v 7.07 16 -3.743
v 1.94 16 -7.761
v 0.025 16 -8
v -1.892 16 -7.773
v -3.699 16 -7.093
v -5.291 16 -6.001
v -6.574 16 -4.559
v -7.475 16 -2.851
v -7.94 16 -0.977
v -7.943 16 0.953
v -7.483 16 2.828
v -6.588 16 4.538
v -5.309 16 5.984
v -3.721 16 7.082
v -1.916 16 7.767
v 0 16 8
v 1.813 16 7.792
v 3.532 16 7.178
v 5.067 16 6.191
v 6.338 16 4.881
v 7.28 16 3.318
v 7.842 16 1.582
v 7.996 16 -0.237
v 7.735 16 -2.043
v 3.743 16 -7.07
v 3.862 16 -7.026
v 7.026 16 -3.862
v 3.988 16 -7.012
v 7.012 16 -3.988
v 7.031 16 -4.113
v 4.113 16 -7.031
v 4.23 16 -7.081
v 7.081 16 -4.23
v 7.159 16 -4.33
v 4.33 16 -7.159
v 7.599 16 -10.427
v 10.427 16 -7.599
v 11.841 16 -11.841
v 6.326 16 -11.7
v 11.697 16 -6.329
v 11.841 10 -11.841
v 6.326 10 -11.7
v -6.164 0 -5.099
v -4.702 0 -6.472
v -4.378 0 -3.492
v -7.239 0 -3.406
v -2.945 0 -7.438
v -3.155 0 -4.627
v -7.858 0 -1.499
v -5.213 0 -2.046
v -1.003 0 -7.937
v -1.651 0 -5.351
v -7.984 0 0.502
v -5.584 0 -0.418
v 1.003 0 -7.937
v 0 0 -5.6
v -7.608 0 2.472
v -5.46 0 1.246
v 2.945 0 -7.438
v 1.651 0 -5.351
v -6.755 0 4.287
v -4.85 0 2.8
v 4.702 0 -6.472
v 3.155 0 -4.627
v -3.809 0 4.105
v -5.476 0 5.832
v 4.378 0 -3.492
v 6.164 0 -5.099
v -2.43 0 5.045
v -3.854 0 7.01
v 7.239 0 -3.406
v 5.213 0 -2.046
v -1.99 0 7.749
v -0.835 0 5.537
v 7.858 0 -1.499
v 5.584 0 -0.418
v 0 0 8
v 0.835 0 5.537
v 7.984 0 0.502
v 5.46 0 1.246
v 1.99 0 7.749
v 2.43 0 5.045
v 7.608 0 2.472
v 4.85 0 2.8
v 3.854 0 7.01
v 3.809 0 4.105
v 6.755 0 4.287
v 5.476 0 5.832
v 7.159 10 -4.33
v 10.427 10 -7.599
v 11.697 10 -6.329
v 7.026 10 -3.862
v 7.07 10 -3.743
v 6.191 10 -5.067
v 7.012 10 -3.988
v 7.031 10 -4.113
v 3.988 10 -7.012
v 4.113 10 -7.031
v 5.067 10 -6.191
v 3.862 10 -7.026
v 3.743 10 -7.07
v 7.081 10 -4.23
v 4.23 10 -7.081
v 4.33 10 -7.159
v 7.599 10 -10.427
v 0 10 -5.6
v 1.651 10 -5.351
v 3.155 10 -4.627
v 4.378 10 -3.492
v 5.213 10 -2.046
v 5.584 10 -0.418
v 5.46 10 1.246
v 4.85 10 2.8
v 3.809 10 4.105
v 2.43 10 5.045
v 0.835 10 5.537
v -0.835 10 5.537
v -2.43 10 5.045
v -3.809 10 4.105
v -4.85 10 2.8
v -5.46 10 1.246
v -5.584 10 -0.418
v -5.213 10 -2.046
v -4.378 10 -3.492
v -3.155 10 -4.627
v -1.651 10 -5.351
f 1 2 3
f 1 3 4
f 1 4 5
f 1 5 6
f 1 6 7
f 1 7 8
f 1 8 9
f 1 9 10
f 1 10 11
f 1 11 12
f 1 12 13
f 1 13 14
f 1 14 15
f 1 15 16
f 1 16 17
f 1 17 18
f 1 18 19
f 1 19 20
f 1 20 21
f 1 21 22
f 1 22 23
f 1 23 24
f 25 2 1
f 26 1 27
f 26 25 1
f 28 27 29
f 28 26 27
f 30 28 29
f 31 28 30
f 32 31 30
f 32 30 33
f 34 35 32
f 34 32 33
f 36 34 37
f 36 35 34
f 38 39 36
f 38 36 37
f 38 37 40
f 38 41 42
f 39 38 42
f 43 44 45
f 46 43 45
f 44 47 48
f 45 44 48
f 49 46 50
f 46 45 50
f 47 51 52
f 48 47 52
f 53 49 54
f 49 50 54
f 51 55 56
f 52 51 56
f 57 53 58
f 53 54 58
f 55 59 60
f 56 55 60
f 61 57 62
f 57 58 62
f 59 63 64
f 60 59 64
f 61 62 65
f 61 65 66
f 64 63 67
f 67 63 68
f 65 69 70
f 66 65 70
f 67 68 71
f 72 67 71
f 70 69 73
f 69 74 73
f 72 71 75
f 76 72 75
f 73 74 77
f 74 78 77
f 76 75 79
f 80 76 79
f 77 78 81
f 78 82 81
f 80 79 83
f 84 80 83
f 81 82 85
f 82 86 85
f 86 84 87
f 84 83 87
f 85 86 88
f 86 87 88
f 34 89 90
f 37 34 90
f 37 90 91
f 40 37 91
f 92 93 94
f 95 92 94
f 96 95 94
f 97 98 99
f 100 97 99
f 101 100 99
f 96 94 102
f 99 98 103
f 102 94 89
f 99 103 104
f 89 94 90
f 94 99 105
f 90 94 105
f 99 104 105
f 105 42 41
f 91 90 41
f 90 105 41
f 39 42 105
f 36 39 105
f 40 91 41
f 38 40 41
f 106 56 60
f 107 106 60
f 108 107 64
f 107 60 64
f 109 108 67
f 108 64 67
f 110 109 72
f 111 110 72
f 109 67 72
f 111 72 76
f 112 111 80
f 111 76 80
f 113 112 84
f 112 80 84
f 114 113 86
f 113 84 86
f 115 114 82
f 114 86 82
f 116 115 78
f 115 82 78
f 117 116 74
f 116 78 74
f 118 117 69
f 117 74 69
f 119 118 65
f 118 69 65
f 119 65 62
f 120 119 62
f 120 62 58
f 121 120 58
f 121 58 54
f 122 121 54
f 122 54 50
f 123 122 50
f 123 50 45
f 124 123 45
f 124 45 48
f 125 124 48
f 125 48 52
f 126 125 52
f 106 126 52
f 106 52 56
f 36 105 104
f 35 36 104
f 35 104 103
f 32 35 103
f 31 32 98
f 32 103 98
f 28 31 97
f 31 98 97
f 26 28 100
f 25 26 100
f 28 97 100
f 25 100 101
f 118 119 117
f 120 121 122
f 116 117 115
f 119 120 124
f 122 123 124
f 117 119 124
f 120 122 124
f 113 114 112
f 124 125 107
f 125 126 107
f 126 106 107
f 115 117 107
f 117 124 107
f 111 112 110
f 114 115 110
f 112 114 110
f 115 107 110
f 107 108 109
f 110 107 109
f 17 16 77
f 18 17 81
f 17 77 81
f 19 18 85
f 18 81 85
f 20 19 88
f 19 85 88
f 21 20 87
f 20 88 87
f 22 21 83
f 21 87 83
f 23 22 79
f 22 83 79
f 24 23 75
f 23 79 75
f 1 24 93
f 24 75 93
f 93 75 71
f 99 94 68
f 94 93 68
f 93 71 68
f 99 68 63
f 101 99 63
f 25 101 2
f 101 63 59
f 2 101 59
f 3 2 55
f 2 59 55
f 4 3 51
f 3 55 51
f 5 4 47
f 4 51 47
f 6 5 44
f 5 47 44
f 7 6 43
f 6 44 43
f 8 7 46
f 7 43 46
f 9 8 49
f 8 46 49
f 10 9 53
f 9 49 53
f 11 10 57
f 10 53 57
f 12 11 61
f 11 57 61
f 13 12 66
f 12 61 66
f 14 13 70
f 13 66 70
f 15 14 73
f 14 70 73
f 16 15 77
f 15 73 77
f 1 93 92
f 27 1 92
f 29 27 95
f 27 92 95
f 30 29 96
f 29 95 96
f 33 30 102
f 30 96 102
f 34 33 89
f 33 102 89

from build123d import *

# Parameters (mm, degrees)
SKETCH1_R           = 8
BOSS_EXTRUDE1_DEPTH = 16
SKETCH2_R           = 5.6
CUT_EXTRUDE1_DEPTH  = 12
BOSS_EXTRUDE2_START = -6
BOSS_EXTRUDE2_DEPTH = 6


with BuildPart() as part:
    # Sketch1 → Boss-Extrude1 (new body)
    with BuildSketch(Plane(origin=(0, 0, 0), x_dir=(1, 0, 0), z_dir=(0, 1, 0))):
        Circle(SKETCH1_R)
    extrude(amount=BOSS_EXTRUDE1_DEPTH)

    # Sketch2 → Cut-Extrude1 (cut)
    with BuildSketch(Plane.XZ):
        Circle(SKETCH2_R)
    extrude(amount=-CUT_EXTRUDE1_DEPTH, mode=Mode.SUBTRACT)

    # Sketch4 → Boss-Extrude2 (add)
    with BuildSketch(Plane(origin=(0, 16, 0), x_dir=(1, 0, 0), z_dir=(0, 1, 0)).offset(BOSS_EXTRUDE2_START)):
        with BuildLine():
            Line((7.598545919, 10.426973043), (4.330349084, 7.158776209))
            ThreePointArc((4.330349084, 7.158776209), (4.05115191, 7.017889357), (3.742866535, 7.070427858))
            ThreePointArc((3.742866535, 7.070427858), (-5.656854249, -5.656854249), (7.070427858, 3.742866535))
            ThreePointArc((7.070427858, 3.742866535), (7.017889357, 4.05115191), (7.158776209, 4.330349084))
            Line((7.158776209, 4.330349084), (10.426973043, 7.598545919))
            Line((10.426973043, 7.598545919), (11.696836602, 6.32868236))
            Line((11.696836602, 6.32868236), (11.841186606, 11.841186606))
            Line((11.841186606, 11.841186606), (6.325753712, 11.699765249))
            Line((6.325753712, 11.699765249), (7.598545919, 10.426973043))
        make_face()
    extrude(amount=BOSS_EXTRUDE2_DEPTH)


solid = part.part
